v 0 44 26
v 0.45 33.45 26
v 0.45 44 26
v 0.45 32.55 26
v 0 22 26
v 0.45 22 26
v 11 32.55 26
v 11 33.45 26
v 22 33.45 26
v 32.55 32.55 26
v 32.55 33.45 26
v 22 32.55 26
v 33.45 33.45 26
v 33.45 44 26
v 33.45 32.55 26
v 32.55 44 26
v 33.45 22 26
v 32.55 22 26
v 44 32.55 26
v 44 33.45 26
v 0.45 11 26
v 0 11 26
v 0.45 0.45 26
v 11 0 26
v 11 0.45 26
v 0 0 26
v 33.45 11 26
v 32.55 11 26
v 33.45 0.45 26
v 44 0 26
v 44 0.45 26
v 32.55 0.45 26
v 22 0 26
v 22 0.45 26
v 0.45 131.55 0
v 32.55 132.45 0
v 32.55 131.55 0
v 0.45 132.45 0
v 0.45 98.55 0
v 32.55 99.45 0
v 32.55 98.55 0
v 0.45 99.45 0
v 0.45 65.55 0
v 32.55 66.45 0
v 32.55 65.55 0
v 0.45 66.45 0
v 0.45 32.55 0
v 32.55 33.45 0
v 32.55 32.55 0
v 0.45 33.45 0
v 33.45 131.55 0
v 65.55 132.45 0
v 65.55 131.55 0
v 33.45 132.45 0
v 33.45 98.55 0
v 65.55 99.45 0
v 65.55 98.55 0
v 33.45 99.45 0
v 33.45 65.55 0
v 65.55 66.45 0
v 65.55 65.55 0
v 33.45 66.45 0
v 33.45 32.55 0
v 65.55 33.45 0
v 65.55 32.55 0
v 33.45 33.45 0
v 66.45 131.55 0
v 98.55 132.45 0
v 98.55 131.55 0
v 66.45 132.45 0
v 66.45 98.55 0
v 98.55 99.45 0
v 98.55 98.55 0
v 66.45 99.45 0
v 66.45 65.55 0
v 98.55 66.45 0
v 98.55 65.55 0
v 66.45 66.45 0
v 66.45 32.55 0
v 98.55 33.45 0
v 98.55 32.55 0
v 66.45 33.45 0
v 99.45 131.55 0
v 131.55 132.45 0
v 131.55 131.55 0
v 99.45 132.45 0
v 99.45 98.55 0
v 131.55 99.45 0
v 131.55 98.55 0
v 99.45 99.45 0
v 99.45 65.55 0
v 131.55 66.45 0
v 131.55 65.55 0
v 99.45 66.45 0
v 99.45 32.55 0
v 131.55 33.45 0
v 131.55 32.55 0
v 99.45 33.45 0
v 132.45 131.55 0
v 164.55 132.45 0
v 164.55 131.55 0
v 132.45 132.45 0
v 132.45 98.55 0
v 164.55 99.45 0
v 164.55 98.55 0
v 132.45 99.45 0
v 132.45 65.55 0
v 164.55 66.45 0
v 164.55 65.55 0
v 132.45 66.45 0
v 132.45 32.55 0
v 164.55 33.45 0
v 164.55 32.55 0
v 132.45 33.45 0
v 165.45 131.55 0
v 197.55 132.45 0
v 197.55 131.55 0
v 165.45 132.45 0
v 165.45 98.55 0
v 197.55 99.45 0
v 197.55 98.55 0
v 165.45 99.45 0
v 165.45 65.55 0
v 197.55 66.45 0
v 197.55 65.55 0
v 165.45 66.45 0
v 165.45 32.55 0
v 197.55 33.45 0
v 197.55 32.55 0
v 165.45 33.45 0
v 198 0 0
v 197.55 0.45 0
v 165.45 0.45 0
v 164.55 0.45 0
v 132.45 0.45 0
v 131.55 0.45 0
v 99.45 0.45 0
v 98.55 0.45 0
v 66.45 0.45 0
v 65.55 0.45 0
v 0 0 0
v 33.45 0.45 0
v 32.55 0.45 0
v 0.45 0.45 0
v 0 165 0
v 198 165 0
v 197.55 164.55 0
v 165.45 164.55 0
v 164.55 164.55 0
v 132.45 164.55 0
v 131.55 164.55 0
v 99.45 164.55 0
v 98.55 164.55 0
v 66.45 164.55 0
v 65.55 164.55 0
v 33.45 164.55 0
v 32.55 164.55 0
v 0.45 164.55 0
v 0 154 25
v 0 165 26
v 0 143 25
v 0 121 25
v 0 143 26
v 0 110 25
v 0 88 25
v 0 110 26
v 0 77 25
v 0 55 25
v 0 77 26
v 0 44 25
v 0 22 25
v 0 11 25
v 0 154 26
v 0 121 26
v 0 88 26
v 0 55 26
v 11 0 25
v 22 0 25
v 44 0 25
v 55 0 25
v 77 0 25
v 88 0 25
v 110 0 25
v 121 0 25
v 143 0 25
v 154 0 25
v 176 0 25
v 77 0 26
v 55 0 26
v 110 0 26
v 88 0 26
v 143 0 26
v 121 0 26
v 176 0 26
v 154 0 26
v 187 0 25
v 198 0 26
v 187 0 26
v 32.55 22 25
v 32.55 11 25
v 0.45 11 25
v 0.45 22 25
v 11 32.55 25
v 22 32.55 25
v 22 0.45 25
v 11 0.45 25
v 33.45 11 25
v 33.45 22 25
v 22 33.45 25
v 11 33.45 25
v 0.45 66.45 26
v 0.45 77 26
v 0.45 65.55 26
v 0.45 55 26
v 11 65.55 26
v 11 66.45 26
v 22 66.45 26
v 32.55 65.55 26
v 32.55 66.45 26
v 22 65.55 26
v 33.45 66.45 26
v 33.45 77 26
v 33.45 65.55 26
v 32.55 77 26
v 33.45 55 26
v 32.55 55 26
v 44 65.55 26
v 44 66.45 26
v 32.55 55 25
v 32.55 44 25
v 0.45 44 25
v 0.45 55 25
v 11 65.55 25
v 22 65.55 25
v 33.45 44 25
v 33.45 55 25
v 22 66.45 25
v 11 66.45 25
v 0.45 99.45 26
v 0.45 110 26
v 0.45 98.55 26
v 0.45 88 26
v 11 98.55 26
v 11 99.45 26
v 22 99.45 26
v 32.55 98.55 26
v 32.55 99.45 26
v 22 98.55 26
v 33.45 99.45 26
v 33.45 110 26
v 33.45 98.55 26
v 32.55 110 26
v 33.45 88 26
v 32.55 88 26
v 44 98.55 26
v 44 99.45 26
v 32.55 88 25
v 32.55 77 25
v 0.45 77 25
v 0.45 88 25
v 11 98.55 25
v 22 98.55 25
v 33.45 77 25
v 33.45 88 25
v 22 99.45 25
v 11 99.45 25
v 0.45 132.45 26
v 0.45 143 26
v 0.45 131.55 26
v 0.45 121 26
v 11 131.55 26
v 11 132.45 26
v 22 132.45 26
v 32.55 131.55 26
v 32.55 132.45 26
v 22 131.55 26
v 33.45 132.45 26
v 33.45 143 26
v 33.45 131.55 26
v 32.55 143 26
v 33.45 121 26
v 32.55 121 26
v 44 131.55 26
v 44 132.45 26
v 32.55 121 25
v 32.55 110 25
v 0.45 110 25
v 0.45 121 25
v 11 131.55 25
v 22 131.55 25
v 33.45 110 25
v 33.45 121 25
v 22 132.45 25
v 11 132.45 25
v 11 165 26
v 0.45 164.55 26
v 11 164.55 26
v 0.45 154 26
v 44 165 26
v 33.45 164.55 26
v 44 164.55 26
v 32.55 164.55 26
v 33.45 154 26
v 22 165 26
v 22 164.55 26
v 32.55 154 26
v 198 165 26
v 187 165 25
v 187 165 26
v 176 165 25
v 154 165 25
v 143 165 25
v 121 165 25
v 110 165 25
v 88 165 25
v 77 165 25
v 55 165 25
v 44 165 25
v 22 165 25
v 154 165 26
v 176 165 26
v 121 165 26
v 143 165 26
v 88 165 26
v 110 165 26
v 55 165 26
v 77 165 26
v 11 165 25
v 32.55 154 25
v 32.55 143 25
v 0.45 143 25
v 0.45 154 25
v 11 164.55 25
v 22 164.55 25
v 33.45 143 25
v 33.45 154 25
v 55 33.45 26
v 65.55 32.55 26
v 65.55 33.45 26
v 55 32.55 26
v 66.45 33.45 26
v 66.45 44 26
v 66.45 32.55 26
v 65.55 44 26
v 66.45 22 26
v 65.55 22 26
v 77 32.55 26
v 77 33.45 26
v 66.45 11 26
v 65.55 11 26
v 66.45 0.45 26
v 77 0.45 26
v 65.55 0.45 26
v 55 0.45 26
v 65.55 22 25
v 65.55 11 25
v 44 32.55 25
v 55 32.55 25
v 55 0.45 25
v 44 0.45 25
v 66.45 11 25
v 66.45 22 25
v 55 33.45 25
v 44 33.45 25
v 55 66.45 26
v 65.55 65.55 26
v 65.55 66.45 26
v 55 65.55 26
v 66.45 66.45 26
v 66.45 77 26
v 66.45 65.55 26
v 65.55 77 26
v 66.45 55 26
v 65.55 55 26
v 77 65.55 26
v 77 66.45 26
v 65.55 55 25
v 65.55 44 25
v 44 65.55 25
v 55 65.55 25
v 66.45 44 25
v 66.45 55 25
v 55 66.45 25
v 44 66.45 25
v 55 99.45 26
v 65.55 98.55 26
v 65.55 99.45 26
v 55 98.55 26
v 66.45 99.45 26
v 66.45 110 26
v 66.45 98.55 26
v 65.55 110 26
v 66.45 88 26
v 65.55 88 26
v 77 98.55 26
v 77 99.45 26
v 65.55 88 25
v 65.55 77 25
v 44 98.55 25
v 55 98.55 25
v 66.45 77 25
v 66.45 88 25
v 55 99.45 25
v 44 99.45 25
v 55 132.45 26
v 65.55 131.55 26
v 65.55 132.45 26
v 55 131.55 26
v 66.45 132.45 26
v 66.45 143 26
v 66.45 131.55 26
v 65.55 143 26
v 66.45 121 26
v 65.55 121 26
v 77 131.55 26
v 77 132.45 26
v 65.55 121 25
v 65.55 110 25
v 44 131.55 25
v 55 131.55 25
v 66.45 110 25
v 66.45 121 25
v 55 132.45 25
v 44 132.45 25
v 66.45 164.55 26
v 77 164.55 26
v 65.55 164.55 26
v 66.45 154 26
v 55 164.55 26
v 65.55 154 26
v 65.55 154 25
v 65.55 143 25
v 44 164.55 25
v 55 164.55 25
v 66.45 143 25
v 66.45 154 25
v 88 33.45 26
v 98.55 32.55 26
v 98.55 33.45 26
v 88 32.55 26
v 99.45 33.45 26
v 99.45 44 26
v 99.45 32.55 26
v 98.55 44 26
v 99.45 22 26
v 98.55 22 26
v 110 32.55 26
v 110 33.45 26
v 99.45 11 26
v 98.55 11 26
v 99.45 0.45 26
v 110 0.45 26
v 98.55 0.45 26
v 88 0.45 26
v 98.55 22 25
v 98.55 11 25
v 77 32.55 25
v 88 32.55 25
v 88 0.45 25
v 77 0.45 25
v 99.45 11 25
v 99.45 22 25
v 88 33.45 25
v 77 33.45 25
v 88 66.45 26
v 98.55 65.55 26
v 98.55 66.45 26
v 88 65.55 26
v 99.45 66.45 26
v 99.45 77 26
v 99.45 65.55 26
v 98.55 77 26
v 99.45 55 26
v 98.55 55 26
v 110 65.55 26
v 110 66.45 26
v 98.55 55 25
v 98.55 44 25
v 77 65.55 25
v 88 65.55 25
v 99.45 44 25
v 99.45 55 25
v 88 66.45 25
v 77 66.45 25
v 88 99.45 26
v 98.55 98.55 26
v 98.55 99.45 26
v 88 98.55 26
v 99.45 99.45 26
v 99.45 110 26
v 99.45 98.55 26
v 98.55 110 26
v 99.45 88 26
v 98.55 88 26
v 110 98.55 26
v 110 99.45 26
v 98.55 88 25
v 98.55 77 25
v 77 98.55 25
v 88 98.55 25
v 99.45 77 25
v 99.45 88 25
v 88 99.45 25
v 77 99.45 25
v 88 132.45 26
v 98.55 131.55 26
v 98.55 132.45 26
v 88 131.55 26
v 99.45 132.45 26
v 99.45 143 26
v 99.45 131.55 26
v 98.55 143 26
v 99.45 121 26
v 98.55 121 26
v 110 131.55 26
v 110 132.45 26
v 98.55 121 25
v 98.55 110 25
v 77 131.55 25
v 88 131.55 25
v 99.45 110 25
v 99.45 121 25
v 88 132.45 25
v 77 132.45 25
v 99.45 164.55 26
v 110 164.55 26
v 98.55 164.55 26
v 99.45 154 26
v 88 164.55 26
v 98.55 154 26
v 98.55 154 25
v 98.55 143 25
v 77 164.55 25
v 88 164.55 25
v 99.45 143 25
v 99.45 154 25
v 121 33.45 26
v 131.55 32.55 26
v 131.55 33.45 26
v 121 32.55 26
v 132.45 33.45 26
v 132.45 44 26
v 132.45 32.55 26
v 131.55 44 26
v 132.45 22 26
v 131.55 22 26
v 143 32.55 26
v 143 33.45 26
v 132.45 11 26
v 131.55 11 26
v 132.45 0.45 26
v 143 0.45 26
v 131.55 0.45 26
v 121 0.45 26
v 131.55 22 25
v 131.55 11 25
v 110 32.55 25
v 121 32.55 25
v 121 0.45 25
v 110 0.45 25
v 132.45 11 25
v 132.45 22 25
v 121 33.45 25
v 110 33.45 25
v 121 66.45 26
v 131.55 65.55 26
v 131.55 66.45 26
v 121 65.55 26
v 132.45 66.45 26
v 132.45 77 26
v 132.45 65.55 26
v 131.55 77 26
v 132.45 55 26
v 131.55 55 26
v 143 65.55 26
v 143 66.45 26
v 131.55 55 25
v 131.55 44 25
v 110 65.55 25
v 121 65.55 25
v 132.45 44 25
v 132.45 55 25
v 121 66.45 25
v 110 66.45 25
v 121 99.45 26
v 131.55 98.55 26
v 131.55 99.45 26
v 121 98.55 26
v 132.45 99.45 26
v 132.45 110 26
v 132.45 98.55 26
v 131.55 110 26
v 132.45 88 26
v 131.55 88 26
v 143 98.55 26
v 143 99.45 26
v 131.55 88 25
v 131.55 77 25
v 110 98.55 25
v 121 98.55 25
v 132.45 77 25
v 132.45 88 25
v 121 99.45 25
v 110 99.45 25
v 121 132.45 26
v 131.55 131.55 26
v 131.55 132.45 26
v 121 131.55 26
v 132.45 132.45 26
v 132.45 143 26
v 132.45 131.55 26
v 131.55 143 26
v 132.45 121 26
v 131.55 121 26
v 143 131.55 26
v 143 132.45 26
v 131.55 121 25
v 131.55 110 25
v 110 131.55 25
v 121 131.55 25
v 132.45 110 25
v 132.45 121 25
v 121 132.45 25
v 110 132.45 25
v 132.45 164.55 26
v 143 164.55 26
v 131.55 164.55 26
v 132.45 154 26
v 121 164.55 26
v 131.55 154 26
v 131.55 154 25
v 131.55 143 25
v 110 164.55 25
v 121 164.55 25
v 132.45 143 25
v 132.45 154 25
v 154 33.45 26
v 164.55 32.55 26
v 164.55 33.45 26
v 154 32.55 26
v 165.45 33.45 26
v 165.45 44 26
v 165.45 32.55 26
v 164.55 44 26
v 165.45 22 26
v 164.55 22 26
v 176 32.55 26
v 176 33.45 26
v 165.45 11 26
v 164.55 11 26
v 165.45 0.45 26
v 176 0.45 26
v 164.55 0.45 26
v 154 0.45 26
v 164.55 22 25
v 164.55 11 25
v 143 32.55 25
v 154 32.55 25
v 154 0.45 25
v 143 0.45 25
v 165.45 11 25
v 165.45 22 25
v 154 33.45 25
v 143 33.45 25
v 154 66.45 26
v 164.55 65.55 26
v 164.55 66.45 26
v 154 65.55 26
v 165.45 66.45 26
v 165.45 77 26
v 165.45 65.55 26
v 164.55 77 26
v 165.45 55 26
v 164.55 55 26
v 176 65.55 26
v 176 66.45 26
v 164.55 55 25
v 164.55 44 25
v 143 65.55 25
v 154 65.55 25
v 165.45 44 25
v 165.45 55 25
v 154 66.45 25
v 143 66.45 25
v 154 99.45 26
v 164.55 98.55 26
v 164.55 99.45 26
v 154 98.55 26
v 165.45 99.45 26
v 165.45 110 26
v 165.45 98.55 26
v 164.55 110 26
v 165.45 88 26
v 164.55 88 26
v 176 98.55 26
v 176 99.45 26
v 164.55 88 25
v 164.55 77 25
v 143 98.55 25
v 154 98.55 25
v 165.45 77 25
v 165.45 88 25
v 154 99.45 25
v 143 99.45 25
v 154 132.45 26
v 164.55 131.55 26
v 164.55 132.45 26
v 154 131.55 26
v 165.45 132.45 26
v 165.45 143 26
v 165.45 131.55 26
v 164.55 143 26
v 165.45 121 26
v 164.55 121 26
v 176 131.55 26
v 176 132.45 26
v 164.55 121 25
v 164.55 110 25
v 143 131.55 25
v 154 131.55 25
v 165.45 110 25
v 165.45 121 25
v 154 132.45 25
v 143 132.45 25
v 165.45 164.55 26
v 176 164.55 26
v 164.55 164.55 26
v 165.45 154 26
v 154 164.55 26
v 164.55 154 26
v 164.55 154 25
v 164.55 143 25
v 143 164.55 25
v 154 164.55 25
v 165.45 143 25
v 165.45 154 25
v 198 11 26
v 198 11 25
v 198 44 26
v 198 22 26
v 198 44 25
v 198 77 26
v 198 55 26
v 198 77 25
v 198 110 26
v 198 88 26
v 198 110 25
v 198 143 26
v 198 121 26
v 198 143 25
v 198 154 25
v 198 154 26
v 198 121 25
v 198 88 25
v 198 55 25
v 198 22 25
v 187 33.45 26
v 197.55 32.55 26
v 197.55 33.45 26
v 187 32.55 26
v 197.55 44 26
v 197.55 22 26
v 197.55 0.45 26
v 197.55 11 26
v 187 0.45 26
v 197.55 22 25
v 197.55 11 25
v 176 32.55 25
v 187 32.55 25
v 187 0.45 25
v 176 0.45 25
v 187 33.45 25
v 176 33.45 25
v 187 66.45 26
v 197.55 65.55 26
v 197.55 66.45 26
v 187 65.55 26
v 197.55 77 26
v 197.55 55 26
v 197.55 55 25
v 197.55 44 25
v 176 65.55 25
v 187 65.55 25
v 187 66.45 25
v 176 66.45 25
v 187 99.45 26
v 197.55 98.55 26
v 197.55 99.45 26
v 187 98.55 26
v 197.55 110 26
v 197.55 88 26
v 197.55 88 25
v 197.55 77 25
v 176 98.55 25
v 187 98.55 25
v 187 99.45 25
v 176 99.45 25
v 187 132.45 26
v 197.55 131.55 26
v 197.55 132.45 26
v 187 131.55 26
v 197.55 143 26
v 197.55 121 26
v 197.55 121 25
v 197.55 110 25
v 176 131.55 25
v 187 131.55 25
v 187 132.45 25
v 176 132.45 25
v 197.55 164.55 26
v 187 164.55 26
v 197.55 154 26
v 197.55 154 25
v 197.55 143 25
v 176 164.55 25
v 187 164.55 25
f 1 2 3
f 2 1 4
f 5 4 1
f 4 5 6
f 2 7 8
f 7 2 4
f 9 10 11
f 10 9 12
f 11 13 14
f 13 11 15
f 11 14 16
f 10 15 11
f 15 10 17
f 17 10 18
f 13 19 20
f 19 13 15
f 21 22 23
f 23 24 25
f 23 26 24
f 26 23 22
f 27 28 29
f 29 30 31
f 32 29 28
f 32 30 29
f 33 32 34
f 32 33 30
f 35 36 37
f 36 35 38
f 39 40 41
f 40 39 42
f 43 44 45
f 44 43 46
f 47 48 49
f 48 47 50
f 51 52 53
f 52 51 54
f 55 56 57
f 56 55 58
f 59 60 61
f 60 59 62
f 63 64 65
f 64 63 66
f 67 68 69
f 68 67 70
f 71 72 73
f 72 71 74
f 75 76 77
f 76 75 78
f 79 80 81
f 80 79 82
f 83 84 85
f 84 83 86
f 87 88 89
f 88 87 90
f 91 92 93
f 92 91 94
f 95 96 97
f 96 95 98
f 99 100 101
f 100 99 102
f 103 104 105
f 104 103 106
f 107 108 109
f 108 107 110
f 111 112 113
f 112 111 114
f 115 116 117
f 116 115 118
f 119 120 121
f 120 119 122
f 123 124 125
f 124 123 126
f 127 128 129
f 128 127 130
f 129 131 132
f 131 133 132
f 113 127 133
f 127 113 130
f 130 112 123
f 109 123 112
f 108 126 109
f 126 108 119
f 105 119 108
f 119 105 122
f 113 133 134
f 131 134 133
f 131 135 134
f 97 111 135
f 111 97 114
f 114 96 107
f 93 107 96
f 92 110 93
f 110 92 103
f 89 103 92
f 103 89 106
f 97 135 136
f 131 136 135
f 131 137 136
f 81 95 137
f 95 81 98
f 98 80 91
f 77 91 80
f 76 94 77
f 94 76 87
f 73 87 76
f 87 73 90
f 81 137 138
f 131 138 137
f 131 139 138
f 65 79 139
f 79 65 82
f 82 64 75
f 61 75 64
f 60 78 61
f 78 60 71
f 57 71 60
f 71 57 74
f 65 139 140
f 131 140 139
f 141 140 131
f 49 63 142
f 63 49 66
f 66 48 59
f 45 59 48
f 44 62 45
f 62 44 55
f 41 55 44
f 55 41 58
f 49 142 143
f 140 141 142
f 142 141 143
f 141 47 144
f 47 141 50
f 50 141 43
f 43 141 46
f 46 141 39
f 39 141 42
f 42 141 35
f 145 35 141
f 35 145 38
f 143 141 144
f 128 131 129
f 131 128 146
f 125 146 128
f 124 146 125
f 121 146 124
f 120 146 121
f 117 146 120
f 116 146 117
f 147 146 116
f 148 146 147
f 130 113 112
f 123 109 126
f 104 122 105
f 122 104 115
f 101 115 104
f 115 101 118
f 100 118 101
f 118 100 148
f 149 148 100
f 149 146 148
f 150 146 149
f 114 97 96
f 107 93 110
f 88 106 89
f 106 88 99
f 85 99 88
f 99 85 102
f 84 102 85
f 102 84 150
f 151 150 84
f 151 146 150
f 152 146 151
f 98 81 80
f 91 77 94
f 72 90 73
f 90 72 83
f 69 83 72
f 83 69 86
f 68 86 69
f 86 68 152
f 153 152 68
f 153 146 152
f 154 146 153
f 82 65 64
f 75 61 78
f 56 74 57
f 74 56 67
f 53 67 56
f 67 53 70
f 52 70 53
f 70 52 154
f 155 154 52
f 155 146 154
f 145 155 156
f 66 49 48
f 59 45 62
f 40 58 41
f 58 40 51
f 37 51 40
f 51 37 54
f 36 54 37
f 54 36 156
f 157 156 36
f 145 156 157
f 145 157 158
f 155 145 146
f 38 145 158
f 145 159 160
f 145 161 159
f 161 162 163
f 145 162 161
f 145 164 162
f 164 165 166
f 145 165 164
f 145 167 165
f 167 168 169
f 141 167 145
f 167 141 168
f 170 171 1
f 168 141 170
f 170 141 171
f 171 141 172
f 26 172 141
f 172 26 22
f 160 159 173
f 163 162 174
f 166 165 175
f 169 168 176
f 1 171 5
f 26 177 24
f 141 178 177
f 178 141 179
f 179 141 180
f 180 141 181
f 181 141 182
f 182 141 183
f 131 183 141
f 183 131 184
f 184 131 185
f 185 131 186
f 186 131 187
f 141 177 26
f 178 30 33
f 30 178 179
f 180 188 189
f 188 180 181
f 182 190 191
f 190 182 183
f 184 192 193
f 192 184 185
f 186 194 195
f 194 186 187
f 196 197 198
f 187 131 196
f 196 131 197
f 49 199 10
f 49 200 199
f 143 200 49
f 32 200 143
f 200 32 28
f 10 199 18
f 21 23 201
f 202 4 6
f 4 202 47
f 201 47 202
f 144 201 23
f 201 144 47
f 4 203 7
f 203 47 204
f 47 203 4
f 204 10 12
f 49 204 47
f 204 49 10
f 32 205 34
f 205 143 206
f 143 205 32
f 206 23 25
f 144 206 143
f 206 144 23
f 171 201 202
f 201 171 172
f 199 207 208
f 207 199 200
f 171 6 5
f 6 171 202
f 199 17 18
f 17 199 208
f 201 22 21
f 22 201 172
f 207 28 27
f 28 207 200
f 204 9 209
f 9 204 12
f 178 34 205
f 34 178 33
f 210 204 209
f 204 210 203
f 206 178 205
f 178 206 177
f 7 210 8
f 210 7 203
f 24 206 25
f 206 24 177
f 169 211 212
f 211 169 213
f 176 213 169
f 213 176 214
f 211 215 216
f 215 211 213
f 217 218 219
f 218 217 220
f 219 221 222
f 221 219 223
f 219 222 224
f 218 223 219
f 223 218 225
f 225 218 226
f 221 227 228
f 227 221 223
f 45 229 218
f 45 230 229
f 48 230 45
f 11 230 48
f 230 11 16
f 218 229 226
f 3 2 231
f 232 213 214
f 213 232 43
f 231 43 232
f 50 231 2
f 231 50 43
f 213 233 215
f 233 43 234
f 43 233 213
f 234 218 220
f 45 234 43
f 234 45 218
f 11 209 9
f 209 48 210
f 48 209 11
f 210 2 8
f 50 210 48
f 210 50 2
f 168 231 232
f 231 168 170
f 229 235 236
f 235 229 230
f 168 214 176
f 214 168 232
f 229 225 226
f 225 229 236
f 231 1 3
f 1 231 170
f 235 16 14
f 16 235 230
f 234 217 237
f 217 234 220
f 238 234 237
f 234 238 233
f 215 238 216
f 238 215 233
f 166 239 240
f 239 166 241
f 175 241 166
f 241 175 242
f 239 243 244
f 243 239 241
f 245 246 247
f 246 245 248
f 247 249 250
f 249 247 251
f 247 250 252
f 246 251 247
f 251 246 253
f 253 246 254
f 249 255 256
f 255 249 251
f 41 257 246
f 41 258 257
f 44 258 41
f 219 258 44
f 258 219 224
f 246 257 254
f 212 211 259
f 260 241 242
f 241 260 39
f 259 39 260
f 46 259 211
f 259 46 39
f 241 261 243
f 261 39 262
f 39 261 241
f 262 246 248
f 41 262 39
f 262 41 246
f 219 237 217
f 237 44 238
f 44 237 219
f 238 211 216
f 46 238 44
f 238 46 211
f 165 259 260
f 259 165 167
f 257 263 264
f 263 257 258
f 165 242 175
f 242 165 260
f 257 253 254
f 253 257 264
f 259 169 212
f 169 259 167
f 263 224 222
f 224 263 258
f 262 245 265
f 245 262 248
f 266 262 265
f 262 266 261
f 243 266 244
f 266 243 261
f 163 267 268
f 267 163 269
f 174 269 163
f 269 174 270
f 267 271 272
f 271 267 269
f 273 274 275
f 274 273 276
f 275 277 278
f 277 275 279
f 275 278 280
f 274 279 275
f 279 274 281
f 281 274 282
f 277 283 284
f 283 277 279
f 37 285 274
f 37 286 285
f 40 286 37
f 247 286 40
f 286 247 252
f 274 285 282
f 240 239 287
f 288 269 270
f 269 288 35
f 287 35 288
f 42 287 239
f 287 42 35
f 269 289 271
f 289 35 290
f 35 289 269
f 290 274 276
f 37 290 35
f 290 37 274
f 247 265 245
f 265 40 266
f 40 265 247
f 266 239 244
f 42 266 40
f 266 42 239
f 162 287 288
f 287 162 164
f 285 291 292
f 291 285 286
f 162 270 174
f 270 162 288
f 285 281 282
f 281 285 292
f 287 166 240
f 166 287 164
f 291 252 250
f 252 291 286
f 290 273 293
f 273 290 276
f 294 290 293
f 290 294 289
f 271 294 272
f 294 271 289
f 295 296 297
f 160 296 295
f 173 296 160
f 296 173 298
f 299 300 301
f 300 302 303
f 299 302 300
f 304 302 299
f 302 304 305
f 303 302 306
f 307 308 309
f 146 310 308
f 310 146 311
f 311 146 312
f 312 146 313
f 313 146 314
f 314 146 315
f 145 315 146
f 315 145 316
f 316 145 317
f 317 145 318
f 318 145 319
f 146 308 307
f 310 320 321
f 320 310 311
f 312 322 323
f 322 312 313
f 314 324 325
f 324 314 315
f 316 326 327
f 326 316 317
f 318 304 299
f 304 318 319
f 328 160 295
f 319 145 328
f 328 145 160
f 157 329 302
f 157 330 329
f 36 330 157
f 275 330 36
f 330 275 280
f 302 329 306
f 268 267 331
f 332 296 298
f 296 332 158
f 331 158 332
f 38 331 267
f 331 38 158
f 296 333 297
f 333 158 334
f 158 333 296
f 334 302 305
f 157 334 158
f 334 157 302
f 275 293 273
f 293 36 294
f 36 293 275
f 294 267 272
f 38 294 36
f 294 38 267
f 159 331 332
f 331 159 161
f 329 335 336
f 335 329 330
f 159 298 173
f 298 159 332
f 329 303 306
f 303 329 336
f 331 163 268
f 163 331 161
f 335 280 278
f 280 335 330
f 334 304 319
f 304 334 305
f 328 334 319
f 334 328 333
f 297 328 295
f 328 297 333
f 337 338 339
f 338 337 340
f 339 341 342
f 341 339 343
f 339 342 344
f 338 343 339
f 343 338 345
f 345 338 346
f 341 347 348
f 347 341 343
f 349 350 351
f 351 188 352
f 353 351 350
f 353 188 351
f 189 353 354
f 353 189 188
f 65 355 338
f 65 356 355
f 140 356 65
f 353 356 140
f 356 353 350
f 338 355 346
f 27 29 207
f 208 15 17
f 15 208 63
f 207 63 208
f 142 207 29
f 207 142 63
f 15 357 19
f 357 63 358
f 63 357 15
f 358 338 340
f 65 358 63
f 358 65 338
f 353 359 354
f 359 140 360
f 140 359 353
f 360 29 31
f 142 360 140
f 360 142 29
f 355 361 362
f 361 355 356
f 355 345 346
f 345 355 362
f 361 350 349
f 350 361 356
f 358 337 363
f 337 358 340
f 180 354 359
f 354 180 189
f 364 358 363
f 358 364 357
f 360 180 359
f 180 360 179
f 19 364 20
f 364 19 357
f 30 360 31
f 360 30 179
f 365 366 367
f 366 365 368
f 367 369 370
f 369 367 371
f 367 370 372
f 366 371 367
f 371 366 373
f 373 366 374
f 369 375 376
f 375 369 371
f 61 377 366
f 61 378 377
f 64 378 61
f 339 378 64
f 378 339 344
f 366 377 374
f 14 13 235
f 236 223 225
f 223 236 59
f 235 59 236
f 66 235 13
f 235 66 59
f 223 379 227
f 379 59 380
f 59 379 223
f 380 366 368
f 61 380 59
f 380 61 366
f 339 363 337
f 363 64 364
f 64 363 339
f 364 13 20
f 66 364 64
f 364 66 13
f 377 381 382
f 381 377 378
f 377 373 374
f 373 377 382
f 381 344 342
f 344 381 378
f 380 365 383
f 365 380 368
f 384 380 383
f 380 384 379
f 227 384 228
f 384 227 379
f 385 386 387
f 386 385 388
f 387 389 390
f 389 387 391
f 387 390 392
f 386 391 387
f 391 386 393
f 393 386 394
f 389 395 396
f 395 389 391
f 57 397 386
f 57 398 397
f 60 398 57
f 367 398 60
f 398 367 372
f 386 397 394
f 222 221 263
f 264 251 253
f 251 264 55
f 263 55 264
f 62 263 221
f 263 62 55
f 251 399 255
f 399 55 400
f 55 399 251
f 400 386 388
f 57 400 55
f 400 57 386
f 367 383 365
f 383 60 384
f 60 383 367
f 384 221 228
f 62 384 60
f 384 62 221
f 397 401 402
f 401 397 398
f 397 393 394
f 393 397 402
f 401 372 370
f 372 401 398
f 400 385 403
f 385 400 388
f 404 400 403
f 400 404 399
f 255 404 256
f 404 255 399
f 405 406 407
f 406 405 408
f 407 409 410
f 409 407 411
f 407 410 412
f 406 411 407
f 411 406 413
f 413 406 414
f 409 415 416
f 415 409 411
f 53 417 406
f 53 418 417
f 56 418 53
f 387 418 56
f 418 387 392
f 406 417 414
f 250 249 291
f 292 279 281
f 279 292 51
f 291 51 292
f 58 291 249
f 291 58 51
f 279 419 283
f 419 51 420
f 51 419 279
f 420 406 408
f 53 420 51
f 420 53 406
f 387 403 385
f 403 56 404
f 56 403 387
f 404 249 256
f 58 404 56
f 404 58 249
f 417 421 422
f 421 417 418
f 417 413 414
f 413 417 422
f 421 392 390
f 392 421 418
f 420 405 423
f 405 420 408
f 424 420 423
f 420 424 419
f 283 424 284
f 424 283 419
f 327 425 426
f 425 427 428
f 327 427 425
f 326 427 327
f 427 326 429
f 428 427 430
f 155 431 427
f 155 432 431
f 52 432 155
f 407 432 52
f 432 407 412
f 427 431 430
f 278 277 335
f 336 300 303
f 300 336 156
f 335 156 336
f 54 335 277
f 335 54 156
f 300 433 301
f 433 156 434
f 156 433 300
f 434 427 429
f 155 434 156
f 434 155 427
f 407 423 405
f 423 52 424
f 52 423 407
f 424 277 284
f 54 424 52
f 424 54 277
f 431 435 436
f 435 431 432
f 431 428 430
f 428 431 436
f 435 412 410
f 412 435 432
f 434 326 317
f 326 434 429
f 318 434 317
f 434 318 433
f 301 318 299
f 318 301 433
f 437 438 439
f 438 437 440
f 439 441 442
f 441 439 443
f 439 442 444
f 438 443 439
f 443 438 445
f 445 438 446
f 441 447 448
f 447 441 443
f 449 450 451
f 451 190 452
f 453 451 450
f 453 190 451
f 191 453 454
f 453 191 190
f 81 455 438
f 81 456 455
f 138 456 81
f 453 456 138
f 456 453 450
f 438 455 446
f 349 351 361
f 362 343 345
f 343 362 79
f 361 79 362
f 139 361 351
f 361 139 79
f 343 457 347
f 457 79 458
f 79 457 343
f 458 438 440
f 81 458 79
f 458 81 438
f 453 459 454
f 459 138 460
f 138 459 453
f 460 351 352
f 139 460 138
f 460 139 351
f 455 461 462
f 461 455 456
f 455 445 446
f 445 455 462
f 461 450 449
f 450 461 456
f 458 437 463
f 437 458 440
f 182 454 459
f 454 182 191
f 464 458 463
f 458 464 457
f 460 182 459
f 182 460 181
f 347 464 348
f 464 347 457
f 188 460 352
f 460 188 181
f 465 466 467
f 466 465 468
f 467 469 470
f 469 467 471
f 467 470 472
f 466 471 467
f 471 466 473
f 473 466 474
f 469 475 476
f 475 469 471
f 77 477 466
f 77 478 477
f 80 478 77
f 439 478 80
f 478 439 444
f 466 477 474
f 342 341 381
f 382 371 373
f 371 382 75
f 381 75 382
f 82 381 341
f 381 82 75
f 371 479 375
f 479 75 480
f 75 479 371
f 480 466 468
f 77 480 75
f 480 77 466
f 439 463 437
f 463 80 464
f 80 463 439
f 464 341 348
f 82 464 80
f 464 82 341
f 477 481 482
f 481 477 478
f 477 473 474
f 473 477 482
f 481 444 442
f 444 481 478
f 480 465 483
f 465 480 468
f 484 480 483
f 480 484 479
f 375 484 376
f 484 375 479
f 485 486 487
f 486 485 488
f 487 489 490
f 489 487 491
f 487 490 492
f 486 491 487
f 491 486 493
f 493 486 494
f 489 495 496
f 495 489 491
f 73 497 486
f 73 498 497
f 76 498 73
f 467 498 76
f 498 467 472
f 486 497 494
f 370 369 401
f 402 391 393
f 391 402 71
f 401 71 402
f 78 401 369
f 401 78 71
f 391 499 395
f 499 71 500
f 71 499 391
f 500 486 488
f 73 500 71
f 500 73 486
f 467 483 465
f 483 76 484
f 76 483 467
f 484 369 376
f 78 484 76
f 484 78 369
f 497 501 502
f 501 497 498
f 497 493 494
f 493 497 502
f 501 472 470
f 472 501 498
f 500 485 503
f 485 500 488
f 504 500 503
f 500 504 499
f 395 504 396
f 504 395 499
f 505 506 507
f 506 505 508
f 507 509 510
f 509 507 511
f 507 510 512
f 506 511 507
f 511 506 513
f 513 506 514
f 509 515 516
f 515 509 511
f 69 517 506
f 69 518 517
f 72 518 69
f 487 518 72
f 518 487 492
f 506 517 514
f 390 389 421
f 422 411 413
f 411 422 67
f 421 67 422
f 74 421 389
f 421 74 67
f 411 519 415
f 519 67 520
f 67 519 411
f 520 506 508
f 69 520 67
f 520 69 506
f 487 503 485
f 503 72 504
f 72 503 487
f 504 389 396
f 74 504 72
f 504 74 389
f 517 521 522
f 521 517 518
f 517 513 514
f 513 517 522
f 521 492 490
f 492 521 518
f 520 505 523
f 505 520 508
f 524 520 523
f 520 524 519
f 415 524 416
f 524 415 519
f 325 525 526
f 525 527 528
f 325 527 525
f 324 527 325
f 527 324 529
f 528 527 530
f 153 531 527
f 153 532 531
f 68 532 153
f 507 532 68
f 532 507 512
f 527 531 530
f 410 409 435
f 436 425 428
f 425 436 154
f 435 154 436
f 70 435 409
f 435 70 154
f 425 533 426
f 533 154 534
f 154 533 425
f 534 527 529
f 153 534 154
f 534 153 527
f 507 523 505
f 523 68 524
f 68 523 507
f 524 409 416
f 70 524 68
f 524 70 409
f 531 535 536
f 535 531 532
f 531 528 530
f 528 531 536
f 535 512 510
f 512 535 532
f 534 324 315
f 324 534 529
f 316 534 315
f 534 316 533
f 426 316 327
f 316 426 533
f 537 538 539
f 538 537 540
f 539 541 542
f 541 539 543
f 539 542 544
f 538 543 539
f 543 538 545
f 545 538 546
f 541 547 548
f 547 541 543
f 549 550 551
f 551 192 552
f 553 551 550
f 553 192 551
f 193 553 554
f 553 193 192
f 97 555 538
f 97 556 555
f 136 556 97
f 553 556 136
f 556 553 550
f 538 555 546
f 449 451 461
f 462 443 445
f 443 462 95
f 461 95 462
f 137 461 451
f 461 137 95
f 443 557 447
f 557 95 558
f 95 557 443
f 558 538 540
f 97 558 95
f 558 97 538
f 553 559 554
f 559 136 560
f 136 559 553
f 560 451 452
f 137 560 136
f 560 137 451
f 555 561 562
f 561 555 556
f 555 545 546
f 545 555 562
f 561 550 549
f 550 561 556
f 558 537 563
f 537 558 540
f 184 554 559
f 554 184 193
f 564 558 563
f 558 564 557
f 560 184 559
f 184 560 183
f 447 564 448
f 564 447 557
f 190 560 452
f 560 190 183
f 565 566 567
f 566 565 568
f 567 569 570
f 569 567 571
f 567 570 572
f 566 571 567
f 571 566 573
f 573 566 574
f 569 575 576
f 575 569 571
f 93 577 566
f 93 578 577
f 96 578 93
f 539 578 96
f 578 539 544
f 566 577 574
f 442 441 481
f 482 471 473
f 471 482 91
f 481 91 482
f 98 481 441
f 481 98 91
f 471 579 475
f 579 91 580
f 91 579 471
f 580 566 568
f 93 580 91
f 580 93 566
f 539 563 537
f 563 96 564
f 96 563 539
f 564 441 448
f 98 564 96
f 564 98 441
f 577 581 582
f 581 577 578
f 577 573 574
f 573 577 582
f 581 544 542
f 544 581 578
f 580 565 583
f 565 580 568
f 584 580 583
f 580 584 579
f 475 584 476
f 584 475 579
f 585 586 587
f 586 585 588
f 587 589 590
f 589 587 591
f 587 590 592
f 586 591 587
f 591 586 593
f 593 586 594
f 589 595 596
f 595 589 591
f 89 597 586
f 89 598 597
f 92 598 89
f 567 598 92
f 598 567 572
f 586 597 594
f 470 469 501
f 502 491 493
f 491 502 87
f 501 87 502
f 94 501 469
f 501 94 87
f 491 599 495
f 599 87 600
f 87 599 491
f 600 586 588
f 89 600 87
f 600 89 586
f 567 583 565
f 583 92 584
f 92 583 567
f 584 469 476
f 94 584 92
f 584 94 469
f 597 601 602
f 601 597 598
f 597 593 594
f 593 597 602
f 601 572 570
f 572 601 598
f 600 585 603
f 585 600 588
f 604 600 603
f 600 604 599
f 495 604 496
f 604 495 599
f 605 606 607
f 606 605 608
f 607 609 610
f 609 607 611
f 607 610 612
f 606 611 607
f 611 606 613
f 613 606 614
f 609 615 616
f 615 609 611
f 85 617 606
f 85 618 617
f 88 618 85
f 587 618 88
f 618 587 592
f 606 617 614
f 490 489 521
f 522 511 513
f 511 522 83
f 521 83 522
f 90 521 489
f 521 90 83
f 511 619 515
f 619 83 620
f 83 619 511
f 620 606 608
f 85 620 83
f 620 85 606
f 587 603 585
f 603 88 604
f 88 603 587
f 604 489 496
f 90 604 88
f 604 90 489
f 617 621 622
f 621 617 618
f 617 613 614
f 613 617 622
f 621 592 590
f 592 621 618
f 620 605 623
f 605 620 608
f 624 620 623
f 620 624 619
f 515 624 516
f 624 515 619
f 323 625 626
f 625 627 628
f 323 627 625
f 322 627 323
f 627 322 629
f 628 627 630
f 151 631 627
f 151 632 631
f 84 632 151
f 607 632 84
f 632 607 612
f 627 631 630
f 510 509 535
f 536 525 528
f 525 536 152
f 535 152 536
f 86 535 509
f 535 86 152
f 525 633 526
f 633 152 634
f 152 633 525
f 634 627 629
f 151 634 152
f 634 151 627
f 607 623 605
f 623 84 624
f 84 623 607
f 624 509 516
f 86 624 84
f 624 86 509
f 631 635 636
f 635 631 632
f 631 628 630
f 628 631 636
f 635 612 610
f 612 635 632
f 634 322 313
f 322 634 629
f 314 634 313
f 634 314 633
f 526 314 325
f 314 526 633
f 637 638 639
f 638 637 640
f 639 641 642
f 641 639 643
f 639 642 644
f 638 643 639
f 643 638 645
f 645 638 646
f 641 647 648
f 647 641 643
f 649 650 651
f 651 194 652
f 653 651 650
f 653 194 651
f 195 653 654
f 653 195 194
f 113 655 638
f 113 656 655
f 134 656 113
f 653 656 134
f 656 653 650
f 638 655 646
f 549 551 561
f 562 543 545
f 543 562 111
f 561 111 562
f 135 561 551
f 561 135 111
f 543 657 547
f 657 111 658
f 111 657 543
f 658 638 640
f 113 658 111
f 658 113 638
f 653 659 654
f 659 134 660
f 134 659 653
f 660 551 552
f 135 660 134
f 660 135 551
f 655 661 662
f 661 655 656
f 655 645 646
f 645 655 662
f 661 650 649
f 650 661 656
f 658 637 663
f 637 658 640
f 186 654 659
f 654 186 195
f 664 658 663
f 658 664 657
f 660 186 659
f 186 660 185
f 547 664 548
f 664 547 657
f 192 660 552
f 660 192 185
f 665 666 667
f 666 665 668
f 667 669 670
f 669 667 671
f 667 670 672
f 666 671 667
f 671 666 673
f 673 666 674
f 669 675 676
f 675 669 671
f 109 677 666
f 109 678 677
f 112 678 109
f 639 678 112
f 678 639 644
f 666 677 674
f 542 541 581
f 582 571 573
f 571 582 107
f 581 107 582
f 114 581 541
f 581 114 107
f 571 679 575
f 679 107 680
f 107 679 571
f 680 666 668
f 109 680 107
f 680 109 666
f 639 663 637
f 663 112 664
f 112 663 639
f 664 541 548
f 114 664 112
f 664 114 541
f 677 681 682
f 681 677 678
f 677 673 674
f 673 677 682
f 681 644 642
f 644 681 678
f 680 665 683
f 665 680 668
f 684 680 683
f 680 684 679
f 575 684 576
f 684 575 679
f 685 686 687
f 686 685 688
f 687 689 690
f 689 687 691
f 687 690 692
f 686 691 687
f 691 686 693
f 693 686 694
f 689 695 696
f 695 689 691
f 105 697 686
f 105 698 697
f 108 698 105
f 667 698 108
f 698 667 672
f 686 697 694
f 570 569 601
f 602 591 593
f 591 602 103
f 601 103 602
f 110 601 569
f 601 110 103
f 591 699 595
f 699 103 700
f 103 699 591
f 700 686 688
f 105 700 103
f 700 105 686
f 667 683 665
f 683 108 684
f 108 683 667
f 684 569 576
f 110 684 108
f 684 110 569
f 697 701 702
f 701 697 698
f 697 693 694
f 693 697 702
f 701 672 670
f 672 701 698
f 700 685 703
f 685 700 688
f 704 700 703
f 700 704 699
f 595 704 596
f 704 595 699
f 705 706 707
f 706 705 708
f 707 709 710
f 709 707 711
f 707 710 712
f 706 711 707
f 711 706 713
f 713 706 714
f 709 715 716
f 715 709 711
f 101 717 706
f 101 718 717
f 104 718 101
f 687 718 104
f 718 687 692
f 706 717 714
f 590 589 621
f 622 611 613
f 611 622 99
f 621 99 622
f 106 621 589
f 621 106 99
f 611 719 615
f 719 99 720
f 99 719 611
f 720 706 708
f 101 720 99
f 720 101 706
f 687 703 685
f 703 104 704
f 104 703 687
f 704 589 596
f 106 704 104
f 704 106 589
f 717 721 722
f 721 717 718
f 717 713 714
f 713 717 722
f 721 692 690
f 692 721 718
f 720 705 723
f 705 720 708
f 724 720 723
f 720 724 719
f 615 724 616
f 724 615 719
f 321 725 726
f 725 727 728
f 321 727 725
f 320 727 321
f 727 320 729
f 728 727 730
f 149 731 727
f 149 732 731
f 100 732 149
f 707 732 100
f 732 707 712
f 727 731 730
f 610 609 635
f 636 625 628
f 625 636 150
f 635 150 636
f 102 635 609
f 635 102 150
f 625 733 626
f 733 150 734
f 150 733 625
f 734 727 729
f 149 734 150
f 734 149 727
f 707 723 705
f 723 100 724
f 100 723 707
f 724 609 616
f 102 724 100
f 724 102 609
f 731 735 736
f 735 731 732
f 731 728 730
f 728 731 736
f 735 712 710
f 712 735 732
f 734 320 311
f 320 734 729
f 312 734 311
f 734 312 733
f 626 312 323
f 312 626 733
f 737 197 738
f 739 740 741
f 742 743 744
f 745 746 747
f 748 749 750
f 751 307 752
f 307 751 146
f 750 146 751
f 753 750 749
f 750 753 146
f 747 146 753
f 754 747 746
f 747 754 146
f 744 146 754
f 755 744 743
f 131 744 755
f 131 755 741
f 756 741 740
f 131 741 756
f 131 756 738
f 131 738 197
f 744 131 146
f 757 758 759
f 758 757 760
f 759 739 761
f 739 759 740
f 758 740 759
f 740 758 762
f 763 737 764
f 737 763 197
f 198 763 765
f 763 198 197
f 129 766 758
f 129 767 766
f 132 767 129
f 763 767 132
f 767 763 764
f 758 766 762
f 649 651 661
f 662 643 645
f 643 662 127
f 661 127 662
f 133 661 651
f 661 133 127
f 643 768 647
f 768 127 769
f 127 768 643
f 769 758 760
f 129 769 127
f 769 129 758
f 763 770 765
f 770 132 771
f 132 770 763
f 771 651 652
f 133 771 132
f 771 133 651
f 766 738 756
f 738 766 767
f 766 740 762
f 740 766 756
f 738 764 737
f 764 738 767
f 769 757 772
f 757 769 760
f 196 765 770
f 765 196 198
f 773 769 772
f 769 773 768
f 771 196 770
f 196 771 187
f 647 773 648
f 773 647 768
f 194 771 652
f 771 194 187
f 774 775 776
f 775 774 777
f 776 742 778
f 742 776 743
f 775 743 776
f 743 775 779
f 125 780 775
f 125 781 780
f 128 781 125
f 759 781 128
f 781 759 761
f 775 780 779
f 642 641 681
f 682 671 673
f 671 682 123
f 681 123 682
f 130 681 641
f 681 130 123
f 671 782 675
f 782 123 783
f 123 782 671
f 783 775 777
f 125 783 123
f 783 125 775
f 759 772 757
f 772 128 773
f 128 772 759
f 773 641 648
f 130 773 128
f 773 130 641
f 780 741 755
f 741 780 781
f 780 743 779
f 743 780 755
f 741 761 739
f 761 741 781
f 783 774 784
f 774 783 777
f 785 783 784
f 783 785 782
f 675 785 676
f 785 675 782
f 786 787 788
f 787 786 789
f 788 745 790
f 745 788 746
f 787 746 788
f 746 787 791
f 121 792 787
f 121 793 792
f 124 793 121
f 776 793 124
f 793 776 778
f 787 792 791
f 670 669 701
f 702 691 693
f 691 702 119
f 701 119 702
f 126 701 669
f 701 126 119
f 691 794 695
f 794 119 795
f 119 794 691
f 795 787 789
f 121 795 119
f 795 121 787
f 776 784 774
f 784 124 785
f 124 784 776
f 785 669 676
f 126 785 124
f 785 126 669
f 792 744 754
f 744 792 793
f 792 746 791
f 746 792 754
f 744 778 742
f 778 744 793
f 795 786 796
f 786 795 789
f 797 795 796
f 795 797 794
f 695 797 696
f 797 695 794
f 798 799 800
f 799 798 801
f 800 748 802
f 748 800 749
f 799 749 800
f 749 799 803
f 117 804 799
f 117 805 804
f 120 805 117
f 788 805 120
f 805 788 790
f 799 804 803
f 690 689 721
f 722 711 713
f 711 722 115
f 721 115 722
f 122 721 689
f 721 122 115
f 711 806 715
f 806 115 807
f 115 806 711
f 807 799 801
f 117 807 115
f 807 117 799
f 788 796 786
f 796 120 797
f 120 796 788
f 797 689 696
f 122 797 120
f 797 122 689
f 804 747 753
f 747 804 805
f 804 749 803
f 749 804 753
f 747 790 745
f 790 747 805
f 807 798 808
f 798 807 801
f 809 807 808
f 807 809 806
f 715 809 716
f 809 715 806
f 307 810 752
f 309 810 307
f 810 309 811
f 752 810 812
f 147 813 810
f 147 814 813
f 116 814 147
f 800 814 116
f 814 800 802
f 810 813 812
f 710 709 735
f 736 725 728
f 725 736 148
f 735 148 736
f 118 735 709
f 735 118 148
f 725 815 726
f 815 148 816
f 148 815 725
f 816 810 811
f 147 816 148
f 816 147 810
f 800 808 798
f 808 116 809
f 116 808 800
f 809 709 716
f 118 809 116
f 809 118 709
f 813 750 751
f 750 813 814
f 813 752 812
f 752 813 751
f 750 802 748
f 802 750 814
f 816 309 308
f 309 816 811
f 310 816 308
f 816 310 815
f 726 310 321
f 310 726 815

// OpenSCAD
dist=33;
led_size=6;
thin_wall_t=0.45;
thick_wall_t=thin_wall_t*2;
height=26;
tol=0.4;
gap_width=11;
gap_height=1;

size_x=6;
size_y=5;

for(_x = [0 : size_x-1]) {
    for(_y = [0 : size_y-1]) {
        t(_x*dist+dist/2, _y*dist+dist/2, 0)outer();
        //t(_x*dist+dist/2, _y*dist+dist/2, 0)inner();
    }
}



module inner() {
t(0, 0, height/2)difference() {
    _size=dist-2*thick_wall_t/2-tol;
    cube([_size, _size, height],center=true);
    cube([_size-2*thin_wall_t, _size-2*thin_wall_t, height*1.1],center=true);
    t(0, 0, height/2-(gap_height+1)/2+1) cube([_size*1.1, gap_width, gap_height+1],center=true);
    t(0, 0, height/2-(gap_height+1)/2+1) cube([gap_width, _size*1.1, gap_height+1],center=true);
}
}
module outer() {
t(0, 0, height/2)difference() {
    cube([dist, dist, height],center=true);
    cube([dist-2*thick_wall_t/2, dist-2*thick_wall_t/2, height*1.1],center=true);
    t(0, 0, height/2-(gap_height+1)/2+1) cube([dist*1.1, gap_width, gap_height+1],center=true);
    t(0, 0, height/2-(gap_height+1)/2+1) cube([gap_width, dist*1.1, gap_height+1],center=true);
}
}

module t(x=0,y=0,z=0) {
    translate([x,y,z])children();
}
module r(x=0,y=0,z=0) {
    rotate([x,y,z])children();
}
